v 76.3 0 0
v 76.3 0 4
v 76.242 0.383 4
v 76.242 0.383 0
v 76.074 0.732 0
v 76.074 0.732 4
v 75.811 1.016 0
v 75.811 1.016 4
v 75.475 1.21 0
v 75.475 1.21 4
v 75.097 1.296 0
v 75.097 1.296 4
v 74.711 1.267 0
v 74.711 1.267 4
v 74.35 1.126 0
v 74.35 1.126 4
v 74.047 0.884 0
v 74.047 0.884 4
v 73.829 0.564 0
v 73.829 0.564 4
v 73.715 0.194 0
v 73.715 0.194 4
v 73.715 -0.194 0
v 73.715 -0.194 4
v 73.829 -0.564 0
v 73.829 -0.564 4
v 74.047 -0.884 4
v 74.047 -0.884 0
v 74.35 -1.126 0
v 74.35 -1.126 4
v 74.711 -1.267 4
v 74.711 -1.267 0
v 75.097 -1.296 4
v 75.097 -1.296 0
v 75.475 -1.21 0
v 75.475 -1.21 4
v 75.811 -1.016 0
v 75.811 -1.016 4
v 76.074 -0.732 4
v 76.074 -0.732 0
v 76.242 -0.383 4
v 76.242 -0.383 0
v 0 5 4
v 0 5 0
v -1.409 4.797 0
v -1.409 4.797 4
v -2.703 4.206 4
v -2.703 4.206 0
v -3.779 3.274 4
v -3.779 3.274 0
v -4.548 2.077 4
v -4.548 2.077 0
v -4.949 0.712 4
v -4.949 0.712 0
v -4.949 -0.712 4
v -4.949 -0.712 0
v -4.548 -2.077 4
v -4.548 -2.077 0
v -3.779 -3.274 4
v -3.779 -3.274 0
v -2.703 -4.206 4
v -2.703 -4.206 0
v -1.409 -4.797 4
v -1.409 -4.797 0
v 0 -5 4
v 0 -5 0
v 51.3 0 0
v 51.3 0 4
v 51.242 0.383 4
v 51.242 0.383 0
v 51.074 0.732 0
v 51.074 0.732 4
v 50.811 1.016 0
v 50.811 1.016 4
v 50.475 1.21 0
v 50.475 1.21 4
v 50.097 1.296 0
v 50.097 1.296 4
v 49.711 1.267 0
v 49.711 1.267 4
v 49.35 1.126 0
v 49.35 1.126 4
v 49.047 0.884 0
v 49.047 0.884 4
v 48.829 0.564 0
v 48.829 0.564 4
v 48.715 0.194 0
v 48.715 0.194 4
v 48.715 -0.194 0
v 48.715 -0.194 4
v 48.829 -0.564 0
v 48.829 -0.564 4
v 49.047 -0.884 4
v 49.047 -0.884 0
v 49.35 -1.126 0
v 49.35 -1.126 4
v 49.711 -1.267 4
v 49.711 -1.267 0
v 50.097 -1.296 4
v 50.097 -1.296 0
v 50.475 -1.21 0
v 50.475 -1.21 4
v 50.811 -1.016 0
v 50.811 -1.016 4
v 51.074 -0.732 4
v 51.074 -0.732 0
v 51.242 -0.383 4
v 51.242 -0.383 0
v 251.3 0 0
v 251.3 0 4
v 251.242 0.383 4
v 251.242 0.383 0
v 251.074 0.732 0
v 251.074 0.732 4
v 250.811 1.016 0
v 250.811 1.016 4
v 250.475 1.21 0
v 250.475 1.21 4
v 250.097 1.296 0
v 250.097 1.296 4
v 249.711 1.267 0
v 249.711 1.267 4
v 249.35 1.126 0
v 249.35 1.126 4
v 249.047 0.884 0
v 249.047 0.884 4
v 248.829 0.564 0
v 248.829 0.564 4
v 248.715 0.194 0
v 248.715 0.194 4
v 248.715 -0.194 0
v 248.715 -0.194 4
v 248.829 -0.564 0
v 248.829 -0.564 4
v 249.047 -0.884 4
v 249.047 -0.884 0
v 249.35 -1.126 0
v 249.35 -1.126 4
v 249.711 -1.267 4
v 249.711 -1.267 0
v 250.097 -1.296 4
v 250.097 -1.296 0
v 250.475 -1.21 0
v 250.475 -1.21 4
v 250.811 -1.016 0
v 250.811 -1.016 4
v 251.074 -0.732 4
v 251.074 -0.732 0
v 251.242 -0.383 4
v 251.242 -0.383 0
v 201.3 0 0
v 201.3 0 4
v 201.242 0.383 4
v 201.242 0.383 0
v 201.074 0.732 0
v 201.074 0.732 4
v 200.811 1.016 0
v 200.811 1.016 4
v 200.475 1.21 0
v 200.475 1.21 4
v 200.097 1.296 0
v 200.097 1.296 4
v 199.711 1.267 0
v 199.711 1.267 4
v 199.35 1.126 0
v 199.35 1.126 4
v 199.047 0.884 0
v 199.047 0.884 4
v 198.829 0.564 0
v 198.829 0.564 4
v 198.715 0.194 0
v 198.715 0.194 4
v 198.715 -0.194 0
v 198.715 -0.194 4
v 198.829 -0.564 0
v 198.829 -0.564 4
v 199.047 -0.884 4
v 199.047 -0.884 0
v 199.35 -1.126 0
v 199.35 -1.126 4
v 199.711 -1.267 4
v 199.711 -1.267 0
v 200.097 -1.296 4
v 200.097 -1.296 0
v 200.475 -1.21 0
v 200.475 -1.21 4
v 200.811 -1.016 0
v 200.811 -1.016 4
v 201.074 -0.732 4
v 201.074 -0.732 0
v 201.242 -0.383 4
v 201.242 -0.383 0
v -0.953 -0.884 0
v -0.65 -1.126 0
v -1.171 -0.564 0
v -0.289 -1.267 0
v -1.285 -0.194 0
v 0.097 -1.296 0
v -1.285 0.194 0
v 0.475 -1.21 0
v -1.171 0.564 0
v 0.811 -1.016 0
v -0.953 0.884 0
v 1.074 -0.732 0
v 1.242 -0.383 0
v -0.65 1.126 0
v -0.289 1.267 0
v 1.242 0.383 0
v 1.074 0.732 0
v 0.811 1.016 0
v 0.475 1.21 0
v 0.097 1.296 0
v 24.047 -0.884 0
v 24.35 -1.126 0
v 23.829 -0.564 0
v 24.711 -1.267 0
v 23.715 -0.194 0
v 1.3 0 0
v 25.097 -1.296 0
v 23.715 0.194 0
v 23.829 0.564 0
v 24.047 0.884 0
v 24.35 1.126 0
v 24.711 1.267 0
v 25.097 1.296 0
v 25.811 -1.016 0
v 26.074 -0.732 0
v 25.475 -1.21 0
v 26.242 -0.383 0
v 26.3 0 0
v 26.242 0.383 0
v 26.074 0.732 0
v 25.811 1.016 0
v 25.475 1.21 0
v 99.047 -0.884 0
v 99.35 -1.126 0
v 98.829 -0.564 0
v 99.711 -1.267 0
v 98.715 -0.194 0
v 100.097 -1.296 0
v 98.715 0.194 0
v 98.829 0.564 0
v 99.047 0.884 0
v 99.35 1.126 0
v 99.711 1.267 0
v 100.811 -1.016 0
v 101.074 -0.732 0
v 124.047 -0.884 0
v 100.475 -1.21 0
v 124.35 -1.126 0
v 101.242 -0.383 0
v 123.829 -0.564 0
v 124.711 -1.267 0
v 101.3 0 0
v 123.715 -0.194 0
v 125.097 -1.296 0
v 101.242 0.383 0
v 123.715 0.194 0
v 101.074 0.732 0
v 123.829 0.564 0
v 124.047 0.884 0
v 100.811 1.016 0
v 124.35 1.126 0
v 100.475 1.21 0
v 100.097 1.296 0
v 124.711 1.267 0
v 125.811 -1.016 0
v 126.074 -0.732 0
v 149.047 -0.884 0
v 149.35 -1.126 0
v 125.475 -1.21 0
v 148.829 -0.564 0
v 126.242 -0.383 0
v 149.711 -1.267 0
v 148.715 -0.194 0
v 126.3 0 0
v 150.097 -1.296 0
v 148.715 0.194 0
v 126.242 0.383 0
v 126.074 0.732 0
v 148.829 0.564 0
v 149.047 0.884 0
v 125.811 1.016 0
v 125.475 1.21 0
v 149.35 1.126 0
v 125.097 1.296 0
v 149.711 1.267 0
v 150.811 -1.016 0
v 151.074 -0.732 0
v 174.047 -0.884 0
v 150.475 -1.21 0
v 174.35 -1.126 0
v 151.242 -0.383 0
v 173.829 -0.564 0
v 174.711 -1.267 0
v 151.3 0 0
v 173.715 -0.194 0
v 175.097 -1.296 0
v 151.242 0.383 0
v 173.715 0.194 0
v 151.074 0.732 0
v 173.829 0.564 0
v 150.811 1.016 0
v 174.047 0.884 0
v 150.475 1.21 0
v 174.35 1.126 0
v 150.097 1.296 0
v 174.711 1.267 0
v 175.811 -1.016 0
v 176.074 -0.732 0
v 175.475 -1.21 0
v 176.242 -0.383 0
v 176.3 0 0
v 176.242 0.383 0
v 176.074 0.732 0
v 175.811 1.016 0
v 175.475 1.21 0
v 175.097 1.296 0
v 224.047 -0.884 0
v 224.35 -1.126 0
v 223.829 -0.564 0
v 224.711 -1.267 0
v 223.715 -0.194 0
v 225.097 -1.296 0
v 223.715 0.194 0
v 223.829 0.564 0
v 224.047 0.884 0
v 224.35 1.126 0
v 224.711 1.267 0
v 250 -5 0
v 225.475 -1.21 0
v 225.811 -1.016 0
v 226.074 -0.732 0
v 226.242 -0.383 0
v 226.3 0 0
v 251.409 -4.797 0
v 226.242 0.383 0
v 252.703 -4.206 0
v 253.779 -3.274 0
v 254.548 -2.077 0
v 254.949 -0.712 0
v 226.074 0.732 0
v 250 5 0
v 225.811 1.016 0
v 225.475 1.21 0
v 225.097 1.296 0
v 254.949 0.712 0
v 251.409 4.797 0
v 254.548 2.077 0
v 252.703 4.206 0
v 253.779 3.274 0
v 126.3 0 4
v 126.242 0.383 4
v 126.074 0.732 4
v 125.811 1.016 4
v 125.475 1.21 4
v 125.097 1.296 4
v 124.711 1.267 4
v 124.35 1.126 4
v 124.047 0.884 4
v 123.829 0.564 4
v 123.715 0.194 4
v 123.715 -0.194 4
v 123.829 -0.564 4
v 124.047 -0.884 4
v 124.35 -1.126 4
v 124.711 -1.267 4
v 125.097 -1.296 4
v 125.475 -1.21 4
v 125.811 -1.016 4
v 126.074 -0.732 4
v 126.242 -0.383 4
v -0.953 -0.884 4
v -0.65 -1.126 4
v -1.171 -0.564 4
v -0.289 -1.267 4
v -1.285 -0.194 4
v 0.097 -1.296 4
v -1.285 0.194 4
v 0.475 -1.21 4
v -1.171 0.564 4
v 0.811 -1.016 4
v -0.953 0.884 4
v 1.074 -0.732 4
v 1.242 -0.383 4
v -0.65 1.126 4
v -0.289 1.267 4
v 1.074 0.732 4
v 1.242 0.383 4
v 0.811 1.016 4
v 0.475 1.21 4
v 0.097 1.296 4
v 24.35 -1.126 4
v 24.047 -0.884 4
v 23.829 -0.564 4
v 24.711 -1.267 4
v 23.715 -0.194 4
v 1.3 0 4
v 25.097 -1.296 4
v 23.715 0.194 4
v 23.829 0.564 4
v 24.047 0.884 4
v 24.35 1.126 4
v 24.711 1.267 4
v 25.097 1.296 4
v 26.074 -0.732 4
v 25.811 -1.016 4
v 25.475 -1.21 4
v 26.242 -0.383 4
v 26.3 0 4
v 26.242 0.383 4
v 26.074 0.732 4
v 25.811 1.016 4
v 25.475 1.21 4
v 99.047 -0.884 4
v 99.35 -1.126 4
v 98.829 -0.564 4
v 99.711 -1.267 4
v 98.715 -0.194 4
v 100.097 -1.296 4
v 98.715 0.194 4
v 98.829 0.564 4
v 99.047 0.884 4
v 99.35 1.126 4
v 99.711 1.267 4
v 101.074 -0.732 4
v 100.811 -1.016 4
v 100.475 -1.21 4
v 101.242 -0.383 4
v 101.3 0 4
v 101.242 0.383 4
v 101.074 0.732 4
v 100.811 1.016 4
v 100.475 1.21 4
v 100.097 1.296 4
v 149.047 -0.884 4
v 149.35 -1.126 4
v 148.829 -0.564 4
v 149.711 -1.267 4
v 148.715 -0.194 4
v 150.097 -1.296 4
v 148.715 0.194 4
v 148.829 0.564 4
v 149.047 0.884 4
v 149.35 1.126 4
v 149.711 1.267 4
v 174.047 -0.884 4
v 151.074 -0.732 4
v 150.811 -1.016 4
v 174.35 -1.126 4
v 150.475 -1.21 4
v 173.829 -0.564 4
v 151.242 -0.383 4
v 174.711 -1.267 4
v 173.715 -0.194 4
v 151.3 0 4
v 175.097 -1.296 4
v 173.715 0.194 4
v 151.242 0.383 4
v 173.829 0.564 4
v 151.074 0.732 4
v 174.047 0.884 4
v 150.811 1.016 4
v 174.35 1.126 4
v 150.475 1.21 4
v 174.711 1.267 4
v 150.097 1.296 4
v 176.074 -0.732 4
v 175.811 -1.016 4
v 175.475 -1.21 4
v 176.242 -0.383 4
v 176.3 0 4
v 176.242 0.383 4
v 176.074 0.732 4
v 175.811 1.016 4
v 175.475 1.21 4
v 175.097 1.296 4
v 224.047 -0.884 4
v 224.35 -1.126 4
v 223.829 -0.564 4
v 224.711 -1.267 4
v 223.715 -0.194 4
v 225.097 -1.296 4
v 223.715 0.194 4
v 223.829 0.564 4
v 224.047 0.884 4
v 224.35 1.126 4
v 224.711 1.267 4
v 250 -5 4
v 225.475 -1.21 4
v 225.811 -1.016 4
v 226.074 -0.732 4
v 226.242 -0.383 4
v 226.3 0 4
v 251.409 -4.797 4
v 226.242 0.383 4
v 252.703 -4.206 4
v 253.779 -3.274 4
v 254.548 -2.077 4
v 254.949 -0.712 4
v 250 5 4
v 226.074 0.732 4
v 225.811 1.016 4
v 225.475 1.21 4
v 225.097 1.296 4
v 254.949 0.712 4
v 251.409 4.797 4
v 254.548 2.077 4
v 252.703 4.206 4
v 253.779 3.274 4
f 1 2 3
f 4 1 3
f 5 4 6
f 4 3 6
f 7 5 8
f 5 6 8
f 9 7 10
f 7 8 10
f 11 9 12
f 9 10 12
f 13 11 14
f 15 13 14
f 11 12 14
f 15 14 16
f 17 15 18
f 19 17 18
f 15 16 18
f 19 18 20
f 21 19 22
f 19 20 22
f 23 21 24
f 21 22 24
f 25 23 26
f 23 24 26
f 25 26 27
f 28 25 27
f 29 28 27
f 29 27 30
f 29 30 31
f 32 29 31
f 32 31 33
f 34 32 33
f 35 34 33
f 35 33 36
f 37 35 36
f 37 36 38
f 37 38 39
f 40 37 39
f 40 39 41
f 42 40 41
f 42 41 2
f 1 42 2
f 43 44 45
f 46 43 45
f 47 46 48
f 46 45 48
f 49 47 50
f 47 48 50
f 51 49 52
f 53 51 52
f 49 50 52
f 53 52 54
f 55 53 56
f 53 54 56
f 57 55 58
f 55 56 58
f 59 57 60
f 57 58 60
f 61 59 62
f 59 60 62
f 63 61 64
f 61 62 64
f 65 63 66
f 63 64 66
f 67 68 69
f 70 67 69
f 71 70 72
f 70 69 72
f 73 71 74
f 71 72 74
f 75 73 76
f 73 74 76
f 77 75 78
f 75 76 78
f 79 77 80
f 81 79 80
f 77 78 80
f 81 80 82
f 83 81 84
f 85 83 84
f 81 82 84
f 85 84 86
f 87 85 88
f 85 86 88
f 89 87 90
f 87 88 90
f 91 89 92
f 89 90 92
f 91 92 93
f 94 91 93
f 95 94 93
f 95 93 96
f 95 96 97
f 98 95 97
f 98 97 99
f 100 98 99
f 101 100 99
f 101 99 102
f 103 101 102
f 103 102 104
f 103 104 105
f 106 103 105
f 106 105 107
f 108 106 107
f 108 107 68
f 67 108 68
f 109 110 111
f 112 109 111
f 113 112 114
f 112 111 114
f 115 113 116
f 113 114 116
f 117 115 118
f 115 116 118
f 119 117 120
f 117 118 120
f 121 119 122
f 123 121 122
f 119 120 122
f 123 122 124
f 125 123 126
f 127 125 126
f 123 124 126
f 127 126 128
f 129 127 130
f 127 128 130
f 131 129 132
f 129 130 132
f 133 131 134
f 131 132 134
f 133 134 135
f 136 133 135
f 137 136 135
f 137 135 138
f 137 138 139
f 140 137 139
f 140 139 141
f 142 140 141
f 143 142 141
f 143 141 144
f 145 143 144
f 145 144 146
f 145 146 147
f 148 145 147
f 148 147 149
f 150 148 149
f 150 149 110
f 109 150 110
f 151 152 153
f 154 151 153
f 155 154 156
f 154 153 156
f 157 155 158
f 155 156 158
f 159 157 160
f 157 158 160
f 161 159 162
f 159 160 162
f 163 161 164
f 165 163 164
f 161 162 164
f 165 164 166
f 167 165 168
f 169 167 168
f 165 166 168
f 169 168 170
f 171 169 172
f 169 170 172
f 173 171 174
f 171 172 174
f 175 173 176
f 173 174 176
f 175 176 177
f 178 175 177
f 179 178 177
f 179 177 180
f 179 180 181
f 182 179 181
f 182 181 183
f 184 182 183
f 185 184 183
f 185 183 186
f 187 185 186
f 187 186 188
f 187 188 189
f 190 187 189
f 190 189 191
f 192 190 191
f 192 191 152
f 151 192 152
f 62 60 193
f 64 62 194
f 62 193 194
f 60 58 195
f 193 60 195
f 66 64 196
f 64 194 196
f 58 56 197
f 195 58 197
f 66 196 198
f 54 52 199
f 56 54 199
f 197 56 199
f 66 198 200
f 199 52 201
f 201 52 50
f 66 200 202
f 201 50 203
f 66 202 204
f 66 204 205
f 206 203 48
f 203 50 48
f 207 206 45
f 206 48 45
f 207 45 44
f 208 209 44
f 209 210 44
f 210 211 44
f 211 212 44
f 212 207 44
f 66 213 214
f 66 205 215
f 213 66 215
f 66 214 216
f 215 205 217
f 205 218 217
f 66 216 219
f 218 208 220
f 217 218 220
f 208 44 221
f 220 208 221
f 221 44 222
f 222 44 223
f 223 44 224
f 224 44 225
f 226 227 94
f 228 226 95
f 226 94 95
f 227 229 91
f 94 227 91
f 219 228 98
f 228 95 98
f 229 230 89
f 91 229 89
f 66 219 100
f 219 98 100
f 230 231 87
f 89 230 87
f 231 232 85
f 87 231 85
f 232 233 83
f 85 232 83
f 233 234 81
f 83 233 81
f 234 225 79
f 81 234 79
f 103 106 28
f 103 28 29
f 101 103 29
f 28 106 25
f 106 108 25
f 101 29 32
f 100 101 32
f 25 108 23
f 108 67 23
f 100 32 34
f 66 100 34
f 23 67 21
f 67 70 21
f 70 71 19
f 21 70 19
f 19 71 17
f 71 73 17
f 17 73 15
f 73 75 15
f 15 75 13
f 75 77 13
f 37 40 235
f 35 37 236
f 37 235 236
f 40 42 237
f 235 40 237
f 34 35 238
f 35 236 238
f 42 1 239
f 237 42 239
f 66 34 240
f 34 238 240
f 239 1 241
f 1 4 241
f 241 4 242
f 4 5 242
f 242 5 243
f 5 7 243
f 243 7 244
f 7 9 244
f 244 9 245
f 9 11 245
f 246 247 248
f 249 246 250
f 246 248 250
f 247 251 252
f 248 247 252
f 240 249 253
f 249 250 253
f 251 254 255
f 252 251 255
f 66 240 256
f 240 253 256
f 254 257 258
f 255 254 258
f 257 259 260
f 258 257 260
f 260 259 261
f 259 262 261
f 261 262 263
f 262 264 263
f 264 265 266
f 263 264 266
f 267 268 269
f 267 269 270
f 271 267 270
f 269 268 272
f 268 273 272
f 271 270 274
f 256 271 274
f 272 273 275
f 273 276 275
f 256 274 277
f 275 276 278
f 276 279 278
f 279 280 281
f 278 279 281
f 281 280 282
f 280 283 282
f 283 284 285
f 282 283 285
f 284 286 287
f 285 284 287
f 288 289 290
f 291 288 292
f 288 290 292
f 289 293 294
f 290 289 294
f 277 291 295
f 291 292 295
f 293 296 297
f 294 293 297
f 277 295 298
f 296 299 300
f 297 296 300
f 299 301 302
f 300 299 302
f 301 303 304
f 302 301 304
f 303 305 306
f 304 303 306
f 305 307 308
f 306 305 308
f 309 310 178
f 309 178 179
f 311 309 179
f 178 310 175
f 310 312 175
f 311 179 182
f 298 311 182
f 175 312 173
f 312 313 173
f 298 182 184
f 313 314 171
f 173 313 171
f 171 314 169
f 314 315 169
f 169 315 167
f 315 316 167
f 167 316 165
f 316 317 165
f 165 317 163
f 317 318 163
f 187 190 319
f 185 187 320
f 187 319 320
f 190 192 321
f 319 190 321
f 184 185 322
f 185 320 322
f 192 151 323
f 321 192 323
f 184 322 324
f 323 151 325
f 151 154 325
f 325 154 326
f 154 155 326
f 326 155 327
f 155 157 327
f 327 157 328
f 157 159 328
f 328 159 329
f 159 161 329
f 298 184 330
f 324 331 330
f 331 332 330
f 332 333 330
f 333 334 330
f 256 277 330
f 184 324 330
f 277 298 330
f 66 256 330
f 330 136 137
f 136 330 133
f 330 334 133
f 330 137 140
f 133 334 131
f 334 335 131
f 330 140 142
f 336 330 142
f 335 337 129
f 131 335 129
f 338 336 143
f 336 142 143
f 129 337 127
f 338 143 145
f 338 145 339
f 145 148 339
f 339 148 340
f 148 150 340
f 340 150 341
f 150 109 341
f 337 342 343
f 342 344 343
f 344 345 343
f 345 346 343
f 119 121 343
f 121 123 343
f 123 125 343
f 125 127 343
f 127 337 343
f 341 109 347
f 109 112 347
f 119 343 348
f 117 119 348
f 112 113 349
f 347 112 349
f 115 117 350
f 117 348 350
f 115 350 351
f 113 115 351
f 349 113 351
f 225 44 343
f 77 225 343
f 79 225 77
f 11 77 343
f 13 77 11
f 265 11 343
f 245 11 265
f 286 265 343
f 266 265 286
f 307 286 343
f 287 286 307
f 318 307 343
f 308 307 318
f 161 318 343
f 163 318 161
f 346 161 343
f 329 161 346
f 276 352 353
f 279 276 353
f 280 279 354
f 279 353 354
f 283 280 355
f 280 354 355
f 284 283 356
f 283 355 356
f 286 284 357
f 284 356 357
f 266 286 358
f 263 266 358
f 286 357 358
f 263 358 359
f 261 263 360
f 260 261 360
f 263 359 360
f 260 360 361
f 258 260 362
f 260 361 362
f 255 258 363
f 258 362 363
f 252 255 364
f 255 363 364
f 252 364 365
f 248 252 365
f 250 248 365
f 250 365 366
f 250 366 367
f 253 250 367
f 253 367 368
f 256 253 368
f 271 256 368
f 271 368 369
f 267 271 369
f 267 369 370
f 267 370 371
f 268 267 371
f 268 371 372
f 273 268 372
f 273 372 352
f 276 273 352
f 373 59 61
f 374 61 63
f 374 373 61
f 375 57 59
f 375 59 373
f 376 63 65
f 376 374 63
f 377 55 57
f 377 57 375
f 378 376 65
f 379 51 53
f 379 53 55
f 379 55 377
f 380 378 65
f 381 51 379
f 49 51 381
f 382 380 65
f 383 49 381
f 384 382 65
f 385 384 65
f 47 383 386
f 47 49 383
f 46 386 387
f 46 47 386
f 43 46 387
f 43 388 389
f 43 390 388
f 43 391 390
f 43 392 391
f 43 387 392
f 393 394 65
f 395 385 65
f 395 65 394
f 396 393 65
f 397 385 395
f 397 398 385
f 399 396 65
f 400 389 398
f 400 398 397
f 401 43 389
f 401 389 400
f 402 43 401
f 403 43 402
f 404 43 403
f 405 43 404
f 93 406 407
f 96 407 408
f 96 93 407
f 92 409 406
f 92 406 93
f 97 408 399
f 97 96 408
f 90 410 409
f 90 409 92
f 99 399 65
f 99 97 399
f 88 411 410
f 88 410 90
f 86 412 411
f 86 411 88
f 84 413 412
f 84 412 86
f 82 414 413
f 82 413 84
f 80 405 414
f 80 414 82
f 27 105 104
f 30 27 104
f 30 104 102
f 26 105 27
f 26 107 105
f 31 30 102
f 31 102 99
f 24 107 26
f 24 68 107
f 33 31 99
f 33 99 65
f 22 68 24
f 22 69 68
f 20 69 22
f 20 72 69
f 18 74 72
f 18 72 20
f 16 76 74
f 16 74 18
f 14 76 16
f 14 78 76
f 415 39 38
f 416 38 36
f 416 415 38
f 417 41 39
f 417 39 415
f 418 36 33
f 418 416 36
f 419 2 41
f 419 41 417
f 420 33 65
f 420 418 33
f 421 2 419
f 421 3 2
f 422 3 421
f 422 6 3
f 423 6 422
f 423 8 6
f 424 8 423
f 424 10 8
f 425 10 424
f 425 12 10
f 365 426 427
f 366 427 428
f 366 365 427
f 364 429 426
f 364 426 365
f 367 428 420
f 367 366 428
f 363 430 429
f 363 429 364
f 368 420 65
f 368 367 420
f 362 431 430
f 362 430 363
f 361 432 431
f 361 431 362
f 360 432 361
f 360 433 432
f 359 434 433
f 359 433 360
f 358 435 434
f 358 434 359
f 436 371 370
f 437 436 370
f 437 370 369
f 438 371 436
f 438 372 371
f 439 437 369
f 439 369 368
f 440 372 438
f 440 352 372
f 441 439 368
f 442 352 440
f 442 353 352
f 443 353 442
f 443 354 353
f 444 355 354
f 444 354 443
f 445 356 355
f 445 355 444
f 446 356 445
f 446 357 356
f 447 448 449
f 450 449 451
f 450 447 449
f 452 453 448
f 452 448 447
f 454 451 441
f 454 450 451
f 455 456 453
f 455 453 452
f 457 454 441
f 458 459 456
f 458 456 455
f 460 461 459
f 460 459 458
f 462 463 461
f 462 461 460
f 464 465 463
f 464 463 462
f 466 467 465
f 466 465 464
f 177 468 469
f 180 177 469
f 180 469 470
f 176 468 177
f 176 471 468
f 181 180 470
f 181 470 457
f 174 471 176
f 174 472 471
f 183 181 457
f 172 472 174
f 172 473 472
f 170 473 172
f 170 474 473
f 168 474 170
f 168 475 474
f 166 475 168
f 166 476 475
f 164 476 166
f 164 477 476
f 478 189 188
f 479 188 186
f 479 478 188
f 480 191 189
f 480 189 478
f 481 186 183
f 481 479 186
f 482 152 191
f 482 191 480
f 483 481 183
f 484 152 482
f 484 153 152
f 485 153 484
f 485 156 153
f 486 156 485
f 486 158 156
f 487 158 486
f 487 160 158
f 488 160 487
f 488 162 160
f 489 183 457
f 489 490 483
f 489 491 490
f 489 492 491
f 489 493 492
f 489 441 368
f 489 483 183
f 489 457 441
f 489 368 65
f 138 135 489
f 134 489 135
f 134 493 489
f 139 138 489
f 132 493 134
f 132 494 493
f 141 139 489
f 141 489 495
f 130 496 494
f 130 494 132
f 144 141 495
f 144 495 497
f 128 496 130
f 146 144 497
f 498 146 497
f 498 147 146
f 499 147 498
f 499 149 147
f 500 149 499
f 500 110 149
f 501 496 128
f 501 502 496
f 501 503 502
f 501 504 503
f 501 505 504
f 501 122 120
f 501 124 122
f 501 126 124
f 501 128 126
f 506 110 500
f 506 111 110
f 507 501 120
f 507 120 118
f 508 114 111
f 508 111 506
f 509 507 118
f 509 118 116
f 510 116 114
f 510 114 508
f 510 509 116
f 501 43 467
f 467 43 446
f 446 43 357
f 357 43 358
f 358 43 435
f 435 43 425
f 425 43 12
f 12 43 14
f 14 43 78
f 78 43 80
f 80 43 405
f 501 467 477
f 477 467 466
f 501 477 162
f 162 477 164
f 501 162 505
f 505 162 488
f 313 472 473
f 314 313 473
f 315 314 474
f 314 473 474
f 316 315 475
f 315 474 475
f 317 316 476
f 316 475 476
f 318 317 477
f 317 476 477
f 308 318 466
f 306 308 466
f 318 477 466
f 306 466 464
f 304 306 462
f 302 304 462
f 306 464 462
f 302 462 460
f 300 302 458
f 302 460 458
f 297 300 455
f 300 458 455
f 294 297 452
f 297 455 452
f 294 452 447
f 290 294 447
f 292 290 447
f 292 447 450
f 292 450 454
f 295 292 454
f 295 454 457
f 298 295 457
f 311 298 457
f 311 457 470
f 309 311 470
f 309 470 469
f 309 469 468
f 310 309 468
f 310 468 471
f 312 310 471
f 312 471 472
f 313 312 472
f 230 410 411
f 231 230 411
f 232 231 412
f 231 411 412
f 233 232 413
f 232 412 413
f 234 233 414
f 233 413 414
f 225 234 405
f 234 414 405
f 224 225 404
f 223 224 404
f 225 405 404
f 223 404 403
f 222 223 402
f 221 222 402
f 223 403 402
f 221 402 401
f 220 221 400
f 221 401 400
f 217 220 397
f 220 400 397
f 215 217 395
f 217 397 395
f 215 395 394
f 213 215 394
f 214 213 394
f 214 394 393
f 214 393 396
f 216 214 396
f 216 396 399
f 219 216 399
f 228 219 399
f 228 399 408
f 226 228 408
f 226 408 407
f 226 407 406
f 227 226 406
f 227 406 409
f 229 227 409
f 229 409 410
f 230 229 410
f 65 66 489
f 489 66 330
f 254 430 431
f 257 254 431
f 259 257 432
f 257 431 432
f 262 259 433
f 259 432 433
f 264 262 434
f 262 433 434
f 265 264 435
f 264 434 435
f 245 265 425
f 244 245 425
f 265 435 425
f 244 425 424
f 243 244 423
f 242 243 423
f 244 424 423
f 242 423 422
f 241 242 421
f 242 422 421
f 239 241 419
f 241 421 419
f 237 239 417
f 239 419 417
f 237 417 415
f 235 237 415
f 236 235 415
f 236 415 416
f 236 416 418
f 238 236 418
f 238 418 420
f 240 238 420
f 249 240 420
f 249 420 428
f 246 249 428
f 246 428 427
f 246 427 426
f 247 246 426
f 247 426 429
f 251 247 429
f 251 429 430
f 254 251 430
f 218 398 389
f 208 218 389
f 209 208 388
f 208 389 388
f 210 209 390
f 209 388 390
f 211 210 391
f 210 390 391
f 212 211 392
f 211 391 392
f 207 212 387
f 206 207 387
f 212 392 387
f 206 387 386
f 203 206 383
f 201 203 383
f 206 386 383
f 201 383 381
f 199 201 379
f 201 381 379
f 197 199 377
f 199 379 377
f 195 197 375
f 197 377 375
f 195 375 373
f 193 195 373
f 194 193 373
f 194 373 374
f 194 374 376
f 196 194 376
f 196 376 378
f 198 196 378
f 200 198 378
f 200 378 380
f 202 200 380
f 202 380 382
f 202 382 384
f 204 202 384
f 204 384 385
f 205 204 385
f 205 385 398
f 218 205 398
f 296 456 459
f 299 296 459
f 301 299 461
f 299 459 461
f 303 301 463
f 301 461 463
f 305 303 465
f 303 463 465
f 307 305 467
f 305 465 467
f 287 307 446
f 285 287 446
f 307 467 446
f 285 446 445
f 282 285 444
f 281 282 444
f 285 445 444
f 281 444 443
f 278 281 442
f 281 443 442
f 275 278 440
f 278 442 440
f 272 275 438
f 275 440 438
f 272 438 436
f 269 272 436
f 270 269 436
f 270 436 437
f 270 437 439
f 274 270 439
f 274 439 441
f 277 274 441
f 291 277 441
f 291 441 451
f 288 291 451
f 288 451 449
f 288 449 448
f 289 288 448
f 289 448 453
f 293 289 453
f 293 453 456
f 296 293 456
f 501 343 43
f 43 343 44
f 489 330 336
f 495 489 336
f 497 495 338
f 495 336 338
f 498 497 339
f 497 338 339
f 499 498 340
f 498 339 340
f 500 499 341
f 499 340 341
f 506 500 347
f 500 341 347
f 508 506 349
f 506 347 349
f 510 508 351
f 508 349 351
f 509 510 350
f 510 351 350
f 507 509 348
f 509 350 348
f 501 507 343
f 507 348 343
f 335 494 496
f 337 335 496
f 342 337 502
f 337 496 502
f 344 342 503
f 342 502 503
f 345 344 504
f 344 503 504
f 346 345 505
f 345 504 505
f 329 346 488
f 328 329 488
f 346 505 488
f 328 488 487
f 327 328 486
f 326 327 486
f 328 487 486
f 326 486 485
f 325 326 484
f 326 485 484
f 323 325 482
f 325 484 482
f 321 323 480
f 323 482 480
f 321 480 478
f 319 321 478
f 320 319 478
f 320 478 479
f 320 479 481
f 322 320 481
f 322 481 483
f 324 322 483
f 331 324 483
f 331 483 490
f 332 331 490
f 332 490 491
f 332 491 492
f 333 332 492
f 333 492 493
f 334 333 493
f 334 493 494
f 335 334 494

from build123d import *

# Parameters (mm, degrees)
SKETCH1_R           = 5
BOSS_EXTRUDE1_DEPTH = 4
SKETCH2_R           = 1.3
CUT_EXTRUDE1_DEPTH  = 256.080379489
LPATTERN1_COUNT     = 10
LPATTERN1_PITCH     = 25


with BuildPart() as part:
    # Sketch1 → Boss-Extrude1 (new body)
    with BuildSketch(Plane.XY):
        with BuildLine():
            Line((250, 5), (0, 5))
            ThreePointArc((0, 5), (3.535533906, 3.535533906), (5, 0))
            ThreePointArc((5, 0), (3.535533906, -3.535533906), (0, -5))
            Line((0, -5), (250, -5))
            ThreePointArc((250, -5), (245, 0), (250, 5))
        make_face()
        with Locations((250, 0)):
            Circle(SKETCH1_R)
        Circle(SKETCH1_R)
    extrude(amount=BOSS_EXTRUDE1_DEPTH)

    # Sketch2 → Cut-Extrude1 (cut, through all)
    with BuildSketch(Plane.XY.offset(4)):
        Circle(SKETCH2_R)
        with Locations((250, 0)):
            Circle(SKETCH2_R)
    cut_extrude1 = extrude(amount=-CUT_EXTRUDE1_DEPTH, mode=Mode.SUBTRACT)

    # LPattern1: Cut-Extrude1 ×10
    with Locations(*[(i * LPATTERN1_PITCH, 0, 0) for i in range(1, LPATTERN1_COUNT)]):
        add(cut_extrude1, mode=Mode.SUBTRACT)


solid = part.part
